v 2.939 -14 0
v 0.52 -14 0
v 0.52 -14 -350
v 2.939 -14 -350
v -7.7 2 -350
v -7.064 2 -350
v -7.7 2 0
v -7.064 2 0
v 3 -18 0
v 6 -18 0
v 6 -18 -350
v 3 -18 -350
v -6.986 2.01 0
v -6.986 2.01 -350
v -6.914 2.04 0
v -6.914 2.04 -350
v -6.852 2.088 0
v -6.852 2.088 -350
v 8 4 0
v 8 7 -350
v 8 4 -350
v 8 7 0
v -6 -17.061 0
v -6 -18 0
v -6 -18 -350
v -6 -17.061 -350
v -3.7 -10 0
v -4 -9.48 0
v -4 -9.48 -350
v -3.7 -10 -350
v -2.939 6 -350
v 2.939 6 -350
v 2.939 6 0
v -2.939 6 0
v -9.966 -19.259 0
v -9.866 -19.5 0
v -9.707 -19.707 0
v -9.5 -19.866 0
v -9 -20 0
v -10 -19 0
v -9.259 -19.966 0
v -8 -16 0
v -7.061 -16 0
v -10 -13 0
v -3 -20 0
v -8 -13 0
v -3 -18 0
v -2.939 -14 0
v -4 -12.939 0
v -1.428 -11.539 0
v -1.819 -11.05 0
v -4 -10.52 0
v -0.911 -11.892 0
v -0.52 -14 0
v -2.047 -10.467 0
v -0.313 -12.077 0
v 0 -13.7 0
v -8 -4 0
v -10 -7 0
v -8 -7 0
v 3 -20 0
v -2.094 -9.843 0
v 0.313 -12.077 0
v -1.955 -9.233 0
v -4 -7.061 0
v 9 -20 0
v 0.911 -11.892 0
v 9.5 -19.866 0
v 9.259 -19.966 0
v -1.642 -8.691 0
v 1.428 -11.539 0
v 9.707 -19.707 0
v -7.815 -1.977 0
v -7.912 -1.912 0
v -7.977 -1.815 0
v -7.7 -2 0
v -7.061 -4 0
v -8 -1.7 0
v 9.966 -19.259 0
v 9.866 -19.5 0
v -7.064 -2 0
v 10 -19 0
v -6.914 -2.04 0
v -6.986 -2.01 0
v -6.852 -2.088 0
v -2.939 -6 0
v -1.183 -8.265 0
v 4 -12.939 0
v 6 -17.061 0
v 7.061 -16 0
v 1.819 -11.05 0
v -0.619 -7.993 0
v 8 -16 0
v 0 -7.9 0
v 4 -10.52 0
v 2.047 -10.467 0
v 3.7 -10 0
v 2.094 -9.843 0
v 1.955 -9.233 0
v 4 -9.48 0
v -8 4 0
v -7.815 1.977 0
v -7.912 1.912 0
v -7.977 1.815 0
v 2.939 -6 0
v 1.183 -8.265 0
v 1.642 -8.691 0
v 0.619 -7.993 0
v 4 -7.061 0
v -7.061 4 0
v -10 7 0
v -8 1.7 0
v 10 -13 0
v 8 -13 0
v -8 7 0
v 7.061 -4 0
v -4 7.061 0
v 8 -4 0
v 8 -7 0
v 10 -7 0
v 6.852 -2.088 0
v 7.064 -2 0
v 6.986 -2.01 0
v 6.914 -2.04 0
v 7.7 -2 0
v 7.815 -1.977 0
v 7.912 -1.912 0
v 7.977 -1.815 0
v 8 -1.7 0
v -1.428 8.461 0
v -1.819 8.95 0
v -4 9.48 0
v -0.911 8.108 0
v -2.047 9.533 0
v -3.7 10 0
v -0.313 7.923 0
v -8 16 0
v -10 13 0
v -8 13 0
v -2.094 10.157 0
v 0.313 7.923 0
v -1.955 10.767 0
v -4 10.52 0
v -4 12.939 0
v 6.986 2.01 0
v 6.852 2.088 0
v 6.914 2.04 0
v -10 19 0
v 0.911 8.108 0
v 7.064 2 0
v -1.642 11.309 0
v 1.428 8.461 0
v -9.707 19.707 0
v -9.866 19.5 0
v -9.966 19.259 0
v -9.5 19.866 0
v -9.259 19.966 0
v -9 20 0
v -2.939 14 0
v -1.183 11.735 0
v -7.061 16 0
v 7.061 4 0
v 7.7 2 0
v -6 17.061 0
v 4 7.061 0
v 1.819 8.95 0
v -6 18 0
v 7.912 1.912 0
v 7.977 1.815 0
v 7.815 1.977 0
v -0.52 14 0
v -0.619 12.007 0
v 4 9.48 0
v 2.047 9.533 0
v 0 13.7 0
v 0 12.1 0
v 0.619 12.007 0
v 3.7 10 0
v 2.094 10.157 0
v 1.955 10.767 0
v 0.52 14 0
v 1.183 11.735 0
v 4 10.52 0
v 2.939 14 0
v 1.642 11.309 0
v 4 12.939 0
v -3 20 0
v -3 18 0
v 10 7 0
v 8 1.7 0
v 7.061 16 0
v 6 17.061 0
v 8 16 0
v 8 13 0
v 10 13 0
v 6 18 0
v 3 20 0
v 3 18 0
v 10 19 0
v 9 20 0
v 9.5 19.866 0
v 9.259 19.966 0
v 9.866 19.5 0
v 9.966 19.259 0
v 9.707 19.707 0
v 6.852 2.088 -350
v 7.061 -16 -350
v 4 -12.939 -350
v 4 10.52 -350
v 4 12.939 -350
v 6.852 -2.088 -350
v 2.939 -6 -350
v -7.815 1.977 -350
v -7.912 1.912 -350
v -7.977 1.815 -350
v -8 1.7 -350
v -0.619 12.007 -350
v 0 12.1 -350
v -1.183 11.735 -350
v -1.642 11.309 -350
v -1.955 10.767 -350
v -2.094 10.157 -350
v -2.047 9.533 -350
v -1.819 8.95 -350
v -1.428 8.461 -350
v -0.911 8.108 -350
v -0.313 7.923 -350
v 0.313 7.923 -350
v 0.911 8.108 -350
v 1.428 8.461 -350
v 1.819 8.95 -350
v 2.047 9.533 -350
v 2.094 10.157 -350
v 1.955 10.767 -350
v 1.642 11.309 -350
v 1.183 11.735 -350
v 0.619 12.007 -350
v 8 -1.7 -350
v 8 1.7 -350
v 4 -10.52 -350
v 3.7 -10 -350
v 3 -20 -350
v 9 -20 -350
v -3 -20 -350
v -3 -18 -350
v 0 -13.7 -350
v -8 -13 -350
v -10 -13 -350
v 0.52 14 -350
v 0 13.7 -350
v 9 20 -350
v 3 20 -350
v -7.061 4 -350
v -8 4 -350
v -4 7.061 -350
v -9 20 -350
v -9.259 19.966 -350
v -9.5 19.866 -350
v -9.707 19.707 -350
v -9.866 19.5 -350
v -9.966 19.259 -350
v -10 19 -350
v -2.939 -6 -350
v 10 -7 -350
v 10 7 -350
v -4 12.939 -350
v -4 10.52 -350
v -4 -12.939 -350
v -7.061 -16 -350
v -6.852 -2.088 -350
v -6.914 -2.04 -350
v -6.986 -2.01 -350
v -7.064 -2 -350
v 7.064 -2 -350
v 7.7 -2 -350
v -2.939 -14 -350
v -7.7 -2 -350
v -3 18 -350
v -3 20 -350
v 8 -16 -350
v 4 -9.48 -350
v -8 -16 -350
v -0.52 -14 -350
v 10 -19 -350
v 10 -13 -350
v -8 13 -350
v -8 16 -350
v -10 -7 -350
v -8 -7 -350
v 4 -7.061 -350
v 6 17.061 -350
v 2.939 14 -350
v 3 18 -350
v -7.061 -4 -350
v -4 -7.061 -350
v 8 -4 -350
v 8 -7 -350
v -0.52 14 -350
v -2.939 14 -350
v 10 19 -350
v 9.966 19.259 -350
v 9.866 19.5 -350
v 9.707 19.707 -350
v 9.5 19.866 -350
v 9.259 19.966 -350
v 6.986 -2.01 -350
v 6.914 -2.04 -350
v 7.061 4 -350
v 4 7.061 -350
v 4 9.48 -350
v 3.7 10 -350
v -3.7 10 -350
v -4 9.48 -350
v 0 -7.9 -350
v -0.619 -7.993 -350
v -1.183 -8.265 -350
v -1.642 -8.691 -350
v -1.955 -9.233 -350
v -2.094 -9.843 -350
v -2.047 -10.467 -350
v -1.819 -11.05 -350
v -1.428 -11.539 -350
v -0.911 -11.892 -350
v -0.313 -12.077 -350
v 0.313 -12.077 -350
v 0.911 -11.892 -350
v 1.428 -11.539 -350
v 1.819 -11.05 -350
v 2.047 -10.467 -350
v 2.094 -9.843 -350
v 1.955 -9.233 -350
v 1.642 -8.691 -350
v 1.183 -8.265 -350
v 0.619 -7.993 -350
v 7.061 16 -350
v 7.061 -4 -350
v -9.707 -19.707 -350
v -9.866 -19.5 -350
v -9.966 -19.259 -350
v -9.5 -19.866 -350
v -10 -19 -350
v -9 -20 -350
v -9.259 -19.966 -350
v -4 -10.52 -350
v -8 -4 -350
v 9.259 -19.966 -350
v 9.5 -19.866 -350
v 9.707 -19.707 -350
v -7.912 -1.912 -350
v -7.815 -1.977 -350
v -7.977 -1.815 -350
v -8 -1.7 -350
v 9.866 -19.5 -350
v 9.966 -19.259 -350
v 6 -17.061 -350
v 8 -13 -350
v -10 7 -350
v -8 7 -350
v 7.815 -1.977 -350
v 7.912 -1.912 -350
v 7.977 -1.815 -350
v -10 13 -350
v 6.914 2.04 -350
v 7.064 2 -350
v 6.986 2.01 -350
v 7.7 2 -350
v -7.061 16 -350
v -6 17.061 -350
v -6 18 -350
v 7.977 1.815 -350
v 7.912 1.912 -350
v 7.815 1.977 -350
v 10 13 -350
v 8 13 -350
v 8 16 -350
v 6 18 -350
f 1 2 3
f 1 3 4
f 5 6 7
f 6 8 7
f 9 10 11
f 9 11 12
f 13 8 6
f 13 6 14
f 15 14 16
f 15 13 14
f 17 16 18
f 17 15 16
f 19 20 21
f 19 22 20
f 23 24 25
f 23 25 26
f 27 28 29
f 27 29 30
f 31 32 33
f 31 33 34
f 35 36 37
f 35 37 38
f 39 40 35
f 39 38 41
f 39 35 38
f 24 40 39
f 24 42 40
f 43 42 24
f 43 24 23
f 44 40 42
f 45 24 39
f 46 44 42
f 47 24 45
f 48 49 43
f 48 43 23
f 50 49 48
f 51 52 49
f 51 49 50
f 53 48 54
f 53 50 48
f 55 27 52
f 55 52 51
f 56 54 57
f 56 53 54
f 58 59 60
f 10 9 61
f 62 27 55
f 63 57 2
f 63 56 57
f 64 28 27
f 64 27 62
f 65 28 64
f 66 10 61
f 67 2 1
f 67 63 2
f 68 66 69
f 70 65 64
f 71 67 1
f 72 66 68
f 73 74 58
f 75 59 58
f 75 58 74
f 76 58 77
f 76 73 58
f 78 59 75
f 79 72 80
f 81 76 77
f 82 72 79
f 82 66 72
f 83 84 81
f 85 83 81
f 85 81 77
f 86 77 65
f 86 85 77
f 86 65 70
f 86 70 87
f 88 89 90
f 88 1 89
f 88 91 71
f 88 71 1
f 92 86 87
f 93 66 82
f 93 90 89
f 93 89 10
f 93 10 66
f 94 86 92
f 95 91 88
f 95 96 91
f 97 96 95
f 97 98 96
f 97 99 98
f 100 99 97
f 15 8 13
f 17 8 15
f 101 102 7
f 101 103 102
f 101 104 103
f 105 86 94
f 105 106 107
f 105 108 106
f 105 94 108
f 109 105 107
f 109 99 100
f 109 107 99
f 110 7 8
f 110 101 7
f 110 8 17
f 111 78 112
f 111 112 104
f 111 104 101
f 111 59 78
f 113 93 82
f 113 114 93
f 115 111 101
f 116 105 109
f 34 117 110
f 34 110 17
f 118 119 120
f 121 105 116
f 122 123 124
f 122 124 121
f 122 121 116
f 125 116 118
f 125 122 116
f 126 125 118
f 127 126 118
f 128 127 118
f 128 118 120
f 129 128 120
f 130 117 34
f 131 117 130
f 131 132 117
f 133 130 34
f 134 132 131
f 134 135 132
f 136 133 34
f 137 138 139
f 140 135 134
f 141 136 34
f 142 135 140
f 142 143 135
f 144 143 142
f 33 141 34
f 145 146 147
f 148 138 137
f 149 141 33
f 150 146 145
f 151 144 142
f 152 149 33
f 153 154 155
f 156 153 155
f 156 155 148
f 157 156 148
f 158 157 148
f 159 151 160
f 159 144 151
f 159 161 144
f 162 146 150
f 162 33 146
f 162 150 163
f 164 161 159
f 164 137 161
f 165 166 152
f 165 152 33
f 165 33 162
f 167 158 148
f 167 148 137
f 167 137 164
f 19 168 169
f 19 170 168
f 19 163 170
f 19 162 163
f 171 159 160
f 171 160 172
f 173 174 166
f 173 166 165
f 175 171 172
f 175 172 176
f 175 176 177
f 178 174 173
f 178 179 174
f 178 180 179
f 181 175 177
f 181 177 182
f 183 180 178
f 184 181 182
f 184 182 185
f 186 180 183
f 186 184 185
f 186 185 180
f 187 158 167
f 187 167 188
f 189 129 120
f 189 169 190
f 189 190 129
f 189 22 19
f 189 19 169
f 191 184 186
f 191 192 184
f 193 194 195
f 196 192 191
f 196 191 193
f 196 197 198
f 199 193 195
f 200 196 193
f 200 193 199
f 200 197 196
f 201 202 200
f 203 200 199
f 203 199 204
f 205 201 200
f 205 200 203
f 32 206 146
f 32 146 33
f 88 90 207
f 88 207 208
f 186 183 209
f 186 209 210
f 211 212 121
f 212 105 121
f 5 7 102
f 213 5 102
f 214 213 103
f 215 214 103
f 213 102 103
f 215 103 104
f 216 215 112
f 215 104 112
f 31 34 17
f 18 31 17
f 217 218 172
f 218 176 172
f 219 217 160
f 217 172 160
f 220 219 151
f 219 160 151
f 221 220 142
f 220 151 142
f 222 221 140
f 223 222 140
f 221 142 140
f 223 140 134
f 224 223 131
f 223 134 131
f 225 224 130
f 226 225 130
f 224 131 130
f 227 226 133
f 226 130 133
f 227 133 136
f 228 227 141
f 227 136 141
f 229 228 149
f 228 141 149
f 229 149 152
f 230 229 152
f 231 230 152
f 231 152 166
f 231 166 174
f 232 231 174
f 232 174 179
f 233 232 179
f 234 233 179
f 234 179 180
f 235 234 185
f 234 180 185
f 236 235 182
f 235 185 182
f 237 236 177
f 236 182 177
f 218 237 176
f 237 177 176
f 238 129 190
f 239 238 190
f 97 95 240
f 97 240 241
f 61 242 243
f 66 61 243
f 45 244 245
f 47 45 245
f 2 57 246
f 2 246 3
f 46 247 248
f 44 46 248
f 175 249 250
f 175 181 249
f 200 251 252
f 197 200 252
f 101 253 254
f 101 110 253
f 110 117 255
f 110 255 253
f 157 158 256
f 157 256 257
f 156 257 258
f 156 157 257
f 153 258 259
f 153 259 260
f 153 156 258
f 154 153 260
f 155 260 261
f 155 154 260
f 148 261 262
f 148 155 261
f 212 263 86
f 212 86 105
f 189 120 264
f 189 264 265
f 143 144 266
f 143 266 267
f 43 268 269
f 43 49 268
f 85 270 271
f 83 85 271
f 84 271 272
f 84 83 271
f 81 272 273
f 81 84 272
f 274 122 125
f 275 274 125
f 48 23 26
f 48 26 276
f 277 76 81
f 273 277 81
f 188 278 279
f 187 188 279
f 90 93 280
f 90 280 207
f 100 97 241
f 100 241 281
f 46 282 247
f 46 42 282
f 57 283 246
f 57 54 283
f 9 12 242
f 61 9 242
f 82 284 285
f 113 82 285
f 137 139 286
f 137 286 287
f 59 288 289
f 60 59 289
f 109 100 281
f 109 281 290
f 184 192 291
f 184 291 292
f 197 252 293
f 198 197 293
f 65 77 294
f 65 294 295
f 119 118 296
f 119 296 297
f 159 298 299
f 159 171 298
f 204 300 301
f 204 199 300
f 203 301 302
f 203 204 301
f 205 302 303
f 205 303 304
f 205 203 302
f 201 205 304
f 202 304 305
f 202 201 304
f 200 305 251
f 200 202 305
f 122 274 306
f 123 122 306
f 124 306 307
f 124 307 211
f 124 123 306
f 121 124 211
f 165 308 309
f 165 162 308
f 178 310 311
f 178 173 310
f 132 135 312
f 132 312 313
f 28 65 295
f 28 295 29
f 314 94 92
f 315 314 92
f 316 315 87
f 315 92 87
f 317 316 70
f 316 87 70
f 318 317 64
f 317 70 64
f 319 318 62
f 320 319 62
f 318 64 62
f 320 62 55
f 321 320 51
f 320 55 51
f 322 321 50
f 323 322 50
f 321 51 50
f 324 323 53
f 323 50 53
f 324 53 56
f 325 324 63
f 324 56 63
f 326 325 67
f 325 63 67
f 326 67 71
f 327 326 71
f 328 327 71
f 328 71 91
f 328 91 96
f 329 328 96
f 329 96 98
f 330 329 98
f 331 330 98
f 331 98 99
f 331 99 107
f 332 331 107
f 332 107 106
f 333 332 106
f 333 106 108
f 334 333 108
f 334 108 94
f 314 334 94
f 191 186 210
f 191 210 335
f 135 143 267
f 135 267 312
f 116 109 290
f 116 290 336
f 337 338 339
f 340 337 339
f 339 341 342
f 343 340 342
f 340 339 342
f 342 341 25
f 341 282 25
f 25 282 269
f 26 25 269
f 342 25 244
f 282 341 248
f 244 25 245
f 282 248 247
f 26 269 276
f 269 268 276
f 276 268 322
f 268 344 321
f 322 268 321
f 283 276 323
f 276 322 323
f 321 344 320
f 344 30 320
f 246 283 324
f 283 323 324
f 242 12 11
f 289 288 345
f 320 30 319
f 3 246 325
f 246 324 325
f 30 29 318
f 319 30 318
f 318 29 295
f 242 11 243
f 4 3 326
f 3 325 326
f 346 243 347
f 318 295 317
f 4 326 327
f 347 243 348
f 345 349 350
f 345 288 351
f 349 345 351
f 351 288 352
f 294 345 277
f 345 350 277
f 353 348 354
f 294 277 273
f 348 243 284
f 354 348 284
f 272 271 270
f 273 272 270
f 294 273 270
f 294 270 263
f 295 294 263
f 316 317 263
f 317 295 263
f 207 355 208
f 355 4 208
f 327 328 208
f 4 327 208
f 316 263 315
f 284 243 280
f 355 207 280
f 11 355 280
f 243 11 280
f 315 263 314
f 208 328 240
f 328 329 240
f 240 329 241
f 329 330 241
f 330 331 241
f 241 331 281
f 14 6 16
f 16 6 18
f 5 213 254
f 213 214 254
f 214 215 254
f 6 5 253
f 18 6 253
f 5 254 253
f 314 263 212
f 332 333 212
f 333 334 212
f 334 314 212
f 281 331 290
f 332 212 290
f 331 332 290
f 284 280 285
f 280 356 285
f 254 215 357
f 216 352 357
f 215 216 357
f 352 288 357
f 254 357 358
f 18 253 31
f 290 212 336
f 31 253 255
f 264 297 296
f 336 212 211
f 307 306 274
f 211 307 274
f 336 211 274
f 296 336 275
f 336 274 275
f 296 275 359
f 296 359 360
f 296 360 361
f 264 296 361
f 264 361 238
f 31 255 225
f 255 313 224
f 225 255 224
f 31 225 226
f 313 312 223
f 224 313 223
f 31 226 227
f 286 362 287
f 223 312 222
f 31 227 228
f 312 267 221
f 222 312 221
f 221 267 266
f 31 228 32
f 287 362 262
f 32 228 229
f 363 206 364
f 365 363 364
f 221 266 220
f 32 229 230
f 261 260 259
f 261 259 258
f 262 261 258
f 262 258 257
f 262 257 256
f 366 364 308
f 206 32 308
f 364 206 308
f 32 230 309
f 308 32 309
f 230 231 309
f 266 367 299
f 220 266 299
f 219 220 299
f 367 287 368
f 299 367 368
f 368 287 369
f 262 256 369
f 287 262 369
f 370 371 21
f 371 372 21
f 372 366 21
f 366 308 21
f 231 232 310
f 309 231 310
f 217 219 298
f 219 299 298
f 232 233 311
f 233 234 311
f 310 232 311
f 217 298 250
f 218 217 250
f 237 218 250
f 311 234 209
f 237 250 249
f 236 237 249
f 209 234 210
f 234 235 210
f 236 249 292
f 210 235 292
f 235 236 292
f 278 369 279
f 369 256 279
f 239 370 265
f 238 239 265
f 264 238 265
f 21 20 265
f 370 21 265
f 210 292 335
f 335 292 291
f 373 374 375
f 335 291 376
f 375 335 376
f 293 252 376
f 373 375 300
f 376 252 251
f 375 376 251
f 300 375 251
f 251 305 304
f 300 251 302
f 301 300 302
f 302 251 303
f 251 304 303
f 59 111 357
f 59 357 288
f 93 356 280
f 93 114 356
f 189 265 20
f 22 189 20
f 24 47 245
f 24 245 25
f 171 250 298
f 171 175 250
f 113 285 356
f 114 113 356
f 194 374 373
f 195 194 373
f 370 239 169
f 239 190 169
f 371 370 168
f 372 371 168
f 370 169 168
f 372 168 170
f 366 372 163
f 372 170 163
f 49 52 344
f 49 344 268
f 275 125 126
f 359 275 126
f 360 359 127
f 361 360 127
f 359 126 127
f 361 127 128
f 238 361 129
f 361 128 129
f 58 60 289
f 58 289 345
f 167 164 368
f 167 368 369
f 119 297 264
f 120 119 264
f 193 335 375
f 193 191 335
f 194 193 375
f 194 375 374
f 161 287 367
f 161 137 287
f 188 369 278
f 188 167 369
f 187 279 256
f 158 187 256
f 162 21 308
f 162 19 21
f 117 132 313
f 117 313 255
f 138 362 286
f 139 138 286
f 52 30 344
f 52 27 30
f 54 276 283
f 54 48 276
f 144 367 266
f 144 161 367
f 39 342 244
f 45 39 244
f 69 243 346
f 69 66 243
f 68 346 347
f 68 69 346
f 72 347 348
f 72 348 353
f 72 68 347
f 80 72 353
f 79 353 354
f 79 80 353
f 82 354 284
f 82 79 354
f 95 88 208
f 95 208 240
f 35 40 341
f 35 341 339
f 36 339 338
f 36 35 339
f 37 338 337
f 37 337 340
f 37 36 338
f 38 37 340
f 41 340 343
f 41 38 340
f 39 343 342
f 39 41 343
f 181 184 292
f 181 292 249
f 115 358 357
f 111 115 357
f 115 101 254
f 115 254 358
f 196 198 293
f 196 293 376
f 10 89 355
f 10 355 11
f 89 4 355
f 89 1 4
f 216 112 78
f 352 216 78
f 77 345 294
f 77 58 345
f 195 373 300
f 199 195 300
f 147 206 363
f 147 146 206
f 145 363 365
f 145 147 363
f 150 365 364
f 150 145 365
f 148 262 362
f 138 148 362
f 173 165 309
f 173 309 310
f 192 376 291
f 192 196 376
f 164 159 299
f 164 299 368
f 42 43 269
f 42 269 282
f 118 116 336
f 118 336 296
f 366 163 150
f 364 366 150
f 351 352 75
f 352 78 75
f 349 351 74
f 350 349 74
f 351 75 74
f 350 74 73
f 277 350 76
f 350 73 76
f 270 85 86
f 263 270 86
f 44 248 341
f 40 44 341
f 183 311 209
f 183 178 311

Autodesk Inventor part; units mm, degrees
sketch "Sketch_1" plane through (0, 0, 0) normal (0, 0, 1) x (1, 0, 0)
  line L0 (-10, -7) -> (-8, -7)
  line L1 (-8, -7) -> (-8, -4)
  line L2 (-8, -4) -> (-7.0607, -4)
  line L3 (-7.0607, -4) -> (-4, -7.0607)
  line L4 (-4, -7.0607) -> (-4, -9.4804)
  line L5 (-4, -9.4804) -> (-3.7, -10)
  line L6 (-3.7, -10) -> (-4, -10.5196)
  line L7 (-4, -10.5196) -> (-4, -12.9393)
  line L8 (-4, -12.9393) -> (-7.0607, -16)
  line L9 (-7.0607, -16) -> (-8, -16)
  line L10 (-8, -16) -> (-8, -13)
  line L11 (-8, -13) -> (-10, -13)
  line L12 (-10, -13) -> (-10, -19)
  arc A0 (-10, -19) -> (-9, -20) centre (-9, -19) ccw
  line L13 (-9, -20) -> (-3, -20)
  line L14 (-3, -20) -> (-3, -18)
  line L15 (-3, -18) -> (-6, -18)
  line L16 (-6, -18) -> (-6, -17.0607)
  line L17 (-6, -17.0607) -> (-2.9393, -14)
  line L18 (-2.9393, -14) -> (-0.5196, -14)
  line L19 (-0.5196, -14) -> (0, -13.7)
  line L20 (0, -13.7) -> (0.5196, -14)
  line L21 (0.5196, -14) -> (2.9393, -14)
  line L22 (2.9393, -14) -> (6, -17.0607)
  line L23 (6, -17.0607) -> (6, -18)
  line L24 (6, -18) -> (3, -18)
  line L25 (3, -18) -> (3, -20)
  line L26 (3, -20) -> (9, -20)
  arc A1 (9, -20) -> (10, -19) centre (9, -19) ccw
  line L27 (10, -19) -> (10, -13)
  line L28 (10, -13) -> (8, -13)
  line L29 (8, -13) -> (8, -16)
  line L30 (8, -16) -> (7.0607, -16)
  line L31 (7.0607, -16) -> (4, -12.9393)
  line L32 (4, -12.9393) -> (4, -10.5196)
  line L33 (4, -10.5196) -> (3.7, -10)
  line L34 (3.7, -10) -> (4, -9.4804)
  line L35 (4, -9.4804) -> (4, -7.0607)
  line L36 (4, -7.0607) -> (7.0607, -4)
  line L37 (7.0607, -4) -> (8, -4)
  line L38 (8, -4) -> (8, -7)
  line L39 (8, -7) -> (10, -7)
  line L40 (10, -7) -> (10, 7)
  line L41 (10, 7) -> (8, 7)
  line L42 (8, 7) -> (8, 4)
  line L43 (8, 4) -> (7.0607, 4)
  line L44 (7.0607, 4) -> (4, 7.0607)
  line L45 (4, 7.0607) -> (4, 9.4804)
  line L46 (4, 9.4804) -> (3.7, 10)
  line L47 (3.7, 10) -> (4, 10.5196)
  line L48 (4, 10.5196) -> (4, 12.9393)
  line L49 (4, 12.9393) -> (7.0607, 16)
  line L50 (7.0607, 16) -> (8, 16)
  line L51 (8, 16) -> (8, 13)
  line L52 (8, 13) -> (10, 13)
  line L53 (10, 13) -> (10, 19)
  arc A2 (10, 19) -> (9, 20) centre (9, 19) ccw
  line L54 (9, 20) -> (3, 20)
  line L55 (3, 20) -> (3, 18)
  line L56 (3, 18) -> (6, 18)
  line L57 (6, 18) -> (6, 17.0607)
  line L58 (6, 17.0607) -> (2.9393, 14)
  line L59 (2.9393, 14) -> (0.5196, 14)
  line L60 (0.5196, 14) -> (0, 13.7)
  line L61 (0, 13.7) -> (-0.5196, 14)
  line L62 (-0.5196, 14) -> (-2.9393, 14)
  line L63 (-2.9393, 14) -> (-6, 17.0607)
  line L64 (-6, 17.0607) -> (-6, 18)
  line L65 (-6, 18) -> (-3, 18)
  line L66 (-3, 18) -> (-3, 20)
  line L67 (-3, 20) -> (-9, 20)
  arc A3 (-9, 20) -> (-10, 19) centre (-9, 19) ccw
  line L68 (-10, 19) -> (-10, 13)
  line L69 (-10, 13) -> (-8, 13)
  line L70 (-8, 13) -> (-8, 16)
  line L71 (-8, 16) -> (-7.0607, 16)
  line L72 (-7.0607, 16) -> (-4, 12.9393)
  line L73 (-4, 12.9393) -> (-4, 10.5196)
  line L74 (-4, 10.5196) -> (-3.7, 10)
  line L75 (-3.7, 10) -> (-4, 9.4804)
  line L76 (-4, 9.4804) -> (-4, 7.0607)
  line L77 (-4, 7.0607) -> (-7.0607, 4)
  line L78 (-7.0607, 4) -> (-8, 4)
  line L79 (-8, 4) -> (-8, 7)
  line L80 (-8, 7) -> (-10, 7)
  line L81 (-10, 7) -> (-10, -7)
  line L82 (-8, 1.7) -> (-8, -1.7)
  arc A4 (-8, -1.7) -> (-7.7, -2) centre (-7.7, -1.7) ccw
  line L83 (-7.7, -2) -> (-7.0636, -2)
  arc A5 (-6.8515, -2.0879) -> (-7.0636, -2) centre (-7.0636, -2.3) ccw
  line L84 (-6.8515, -2.0879) -> (-2.9393, -6)
  line L85 (-2.9393, -6) -> (2.9393, -6)
  line L86 (2.9393, -6) -> (6.8515, -2.0879)
  arc A6 (7.0636, -2) -> (6.8515, -2.0879) centre (7.0636, -2.3) ccw
  line L87 (7.0636, -2) -> (7.7, -2)
  arc A7 (7.7, -2) -> (8, -1.7) centre (7.7, -1.7) ccw
  line L88 (8, -1.7) -> (8, 1.7)
  arc A8 (8, 1.7) -> (7.7, 2) centre (7.7, 1.7) ccw
  line L89 (7.7, 2) -> (7.0636, 2)
  arc A9 (6.8515, 2.0879) -> (7.0636, 2) centre (7.0636, 2.3) ccw
  line L90 (6.8515, 2.0879) -> (2.9393, 6)
  line L91 (2.9393, 6) -> (-2.9393, 6)
  line L92 (-2.9393, 6) -> (-6.8515, 2.0879)
  arc A10 (-7.0636, 2) -> (-6.8515, 2.0879) centre (-7.0636, 2.3) ccw
  line L93 (-7.0636, 2) -> (-7.7, 2)
  arc A11 (-7.7, 2) -> (-8, 1.7) centre (-7.7, 1.7) ccw
extrude "Extrusion1" add sketch "Sketch_1" against normal blind 350
sketch "Sketch2" plane through (0, 0, -350) normal (0, 0, -1) x (-1, 0, 0)
  point P0 (0, 10)
hole "Hole1" at (0, 10, -350) direction (0, 0, 1) diameter 4.2 depth 350
pattern_linear "Rectangular Pattern1" count 2 spacing 20 along (0, -1, 0) of "Hole1"
ref_plane "C1_XY" through (0, 0, 0) normal (0, 0, 1) x (1, 0, 0)
ref_plane "C1_YZ" through (0, 0, 0) normal (1, 0, 0) x (0, 1, 0)
ref_plane "C1_ZX" through (0, 0, 0) normal (0, 1, 0) x (0, 0, 1)
properties part number "HFS5-2040-350"
